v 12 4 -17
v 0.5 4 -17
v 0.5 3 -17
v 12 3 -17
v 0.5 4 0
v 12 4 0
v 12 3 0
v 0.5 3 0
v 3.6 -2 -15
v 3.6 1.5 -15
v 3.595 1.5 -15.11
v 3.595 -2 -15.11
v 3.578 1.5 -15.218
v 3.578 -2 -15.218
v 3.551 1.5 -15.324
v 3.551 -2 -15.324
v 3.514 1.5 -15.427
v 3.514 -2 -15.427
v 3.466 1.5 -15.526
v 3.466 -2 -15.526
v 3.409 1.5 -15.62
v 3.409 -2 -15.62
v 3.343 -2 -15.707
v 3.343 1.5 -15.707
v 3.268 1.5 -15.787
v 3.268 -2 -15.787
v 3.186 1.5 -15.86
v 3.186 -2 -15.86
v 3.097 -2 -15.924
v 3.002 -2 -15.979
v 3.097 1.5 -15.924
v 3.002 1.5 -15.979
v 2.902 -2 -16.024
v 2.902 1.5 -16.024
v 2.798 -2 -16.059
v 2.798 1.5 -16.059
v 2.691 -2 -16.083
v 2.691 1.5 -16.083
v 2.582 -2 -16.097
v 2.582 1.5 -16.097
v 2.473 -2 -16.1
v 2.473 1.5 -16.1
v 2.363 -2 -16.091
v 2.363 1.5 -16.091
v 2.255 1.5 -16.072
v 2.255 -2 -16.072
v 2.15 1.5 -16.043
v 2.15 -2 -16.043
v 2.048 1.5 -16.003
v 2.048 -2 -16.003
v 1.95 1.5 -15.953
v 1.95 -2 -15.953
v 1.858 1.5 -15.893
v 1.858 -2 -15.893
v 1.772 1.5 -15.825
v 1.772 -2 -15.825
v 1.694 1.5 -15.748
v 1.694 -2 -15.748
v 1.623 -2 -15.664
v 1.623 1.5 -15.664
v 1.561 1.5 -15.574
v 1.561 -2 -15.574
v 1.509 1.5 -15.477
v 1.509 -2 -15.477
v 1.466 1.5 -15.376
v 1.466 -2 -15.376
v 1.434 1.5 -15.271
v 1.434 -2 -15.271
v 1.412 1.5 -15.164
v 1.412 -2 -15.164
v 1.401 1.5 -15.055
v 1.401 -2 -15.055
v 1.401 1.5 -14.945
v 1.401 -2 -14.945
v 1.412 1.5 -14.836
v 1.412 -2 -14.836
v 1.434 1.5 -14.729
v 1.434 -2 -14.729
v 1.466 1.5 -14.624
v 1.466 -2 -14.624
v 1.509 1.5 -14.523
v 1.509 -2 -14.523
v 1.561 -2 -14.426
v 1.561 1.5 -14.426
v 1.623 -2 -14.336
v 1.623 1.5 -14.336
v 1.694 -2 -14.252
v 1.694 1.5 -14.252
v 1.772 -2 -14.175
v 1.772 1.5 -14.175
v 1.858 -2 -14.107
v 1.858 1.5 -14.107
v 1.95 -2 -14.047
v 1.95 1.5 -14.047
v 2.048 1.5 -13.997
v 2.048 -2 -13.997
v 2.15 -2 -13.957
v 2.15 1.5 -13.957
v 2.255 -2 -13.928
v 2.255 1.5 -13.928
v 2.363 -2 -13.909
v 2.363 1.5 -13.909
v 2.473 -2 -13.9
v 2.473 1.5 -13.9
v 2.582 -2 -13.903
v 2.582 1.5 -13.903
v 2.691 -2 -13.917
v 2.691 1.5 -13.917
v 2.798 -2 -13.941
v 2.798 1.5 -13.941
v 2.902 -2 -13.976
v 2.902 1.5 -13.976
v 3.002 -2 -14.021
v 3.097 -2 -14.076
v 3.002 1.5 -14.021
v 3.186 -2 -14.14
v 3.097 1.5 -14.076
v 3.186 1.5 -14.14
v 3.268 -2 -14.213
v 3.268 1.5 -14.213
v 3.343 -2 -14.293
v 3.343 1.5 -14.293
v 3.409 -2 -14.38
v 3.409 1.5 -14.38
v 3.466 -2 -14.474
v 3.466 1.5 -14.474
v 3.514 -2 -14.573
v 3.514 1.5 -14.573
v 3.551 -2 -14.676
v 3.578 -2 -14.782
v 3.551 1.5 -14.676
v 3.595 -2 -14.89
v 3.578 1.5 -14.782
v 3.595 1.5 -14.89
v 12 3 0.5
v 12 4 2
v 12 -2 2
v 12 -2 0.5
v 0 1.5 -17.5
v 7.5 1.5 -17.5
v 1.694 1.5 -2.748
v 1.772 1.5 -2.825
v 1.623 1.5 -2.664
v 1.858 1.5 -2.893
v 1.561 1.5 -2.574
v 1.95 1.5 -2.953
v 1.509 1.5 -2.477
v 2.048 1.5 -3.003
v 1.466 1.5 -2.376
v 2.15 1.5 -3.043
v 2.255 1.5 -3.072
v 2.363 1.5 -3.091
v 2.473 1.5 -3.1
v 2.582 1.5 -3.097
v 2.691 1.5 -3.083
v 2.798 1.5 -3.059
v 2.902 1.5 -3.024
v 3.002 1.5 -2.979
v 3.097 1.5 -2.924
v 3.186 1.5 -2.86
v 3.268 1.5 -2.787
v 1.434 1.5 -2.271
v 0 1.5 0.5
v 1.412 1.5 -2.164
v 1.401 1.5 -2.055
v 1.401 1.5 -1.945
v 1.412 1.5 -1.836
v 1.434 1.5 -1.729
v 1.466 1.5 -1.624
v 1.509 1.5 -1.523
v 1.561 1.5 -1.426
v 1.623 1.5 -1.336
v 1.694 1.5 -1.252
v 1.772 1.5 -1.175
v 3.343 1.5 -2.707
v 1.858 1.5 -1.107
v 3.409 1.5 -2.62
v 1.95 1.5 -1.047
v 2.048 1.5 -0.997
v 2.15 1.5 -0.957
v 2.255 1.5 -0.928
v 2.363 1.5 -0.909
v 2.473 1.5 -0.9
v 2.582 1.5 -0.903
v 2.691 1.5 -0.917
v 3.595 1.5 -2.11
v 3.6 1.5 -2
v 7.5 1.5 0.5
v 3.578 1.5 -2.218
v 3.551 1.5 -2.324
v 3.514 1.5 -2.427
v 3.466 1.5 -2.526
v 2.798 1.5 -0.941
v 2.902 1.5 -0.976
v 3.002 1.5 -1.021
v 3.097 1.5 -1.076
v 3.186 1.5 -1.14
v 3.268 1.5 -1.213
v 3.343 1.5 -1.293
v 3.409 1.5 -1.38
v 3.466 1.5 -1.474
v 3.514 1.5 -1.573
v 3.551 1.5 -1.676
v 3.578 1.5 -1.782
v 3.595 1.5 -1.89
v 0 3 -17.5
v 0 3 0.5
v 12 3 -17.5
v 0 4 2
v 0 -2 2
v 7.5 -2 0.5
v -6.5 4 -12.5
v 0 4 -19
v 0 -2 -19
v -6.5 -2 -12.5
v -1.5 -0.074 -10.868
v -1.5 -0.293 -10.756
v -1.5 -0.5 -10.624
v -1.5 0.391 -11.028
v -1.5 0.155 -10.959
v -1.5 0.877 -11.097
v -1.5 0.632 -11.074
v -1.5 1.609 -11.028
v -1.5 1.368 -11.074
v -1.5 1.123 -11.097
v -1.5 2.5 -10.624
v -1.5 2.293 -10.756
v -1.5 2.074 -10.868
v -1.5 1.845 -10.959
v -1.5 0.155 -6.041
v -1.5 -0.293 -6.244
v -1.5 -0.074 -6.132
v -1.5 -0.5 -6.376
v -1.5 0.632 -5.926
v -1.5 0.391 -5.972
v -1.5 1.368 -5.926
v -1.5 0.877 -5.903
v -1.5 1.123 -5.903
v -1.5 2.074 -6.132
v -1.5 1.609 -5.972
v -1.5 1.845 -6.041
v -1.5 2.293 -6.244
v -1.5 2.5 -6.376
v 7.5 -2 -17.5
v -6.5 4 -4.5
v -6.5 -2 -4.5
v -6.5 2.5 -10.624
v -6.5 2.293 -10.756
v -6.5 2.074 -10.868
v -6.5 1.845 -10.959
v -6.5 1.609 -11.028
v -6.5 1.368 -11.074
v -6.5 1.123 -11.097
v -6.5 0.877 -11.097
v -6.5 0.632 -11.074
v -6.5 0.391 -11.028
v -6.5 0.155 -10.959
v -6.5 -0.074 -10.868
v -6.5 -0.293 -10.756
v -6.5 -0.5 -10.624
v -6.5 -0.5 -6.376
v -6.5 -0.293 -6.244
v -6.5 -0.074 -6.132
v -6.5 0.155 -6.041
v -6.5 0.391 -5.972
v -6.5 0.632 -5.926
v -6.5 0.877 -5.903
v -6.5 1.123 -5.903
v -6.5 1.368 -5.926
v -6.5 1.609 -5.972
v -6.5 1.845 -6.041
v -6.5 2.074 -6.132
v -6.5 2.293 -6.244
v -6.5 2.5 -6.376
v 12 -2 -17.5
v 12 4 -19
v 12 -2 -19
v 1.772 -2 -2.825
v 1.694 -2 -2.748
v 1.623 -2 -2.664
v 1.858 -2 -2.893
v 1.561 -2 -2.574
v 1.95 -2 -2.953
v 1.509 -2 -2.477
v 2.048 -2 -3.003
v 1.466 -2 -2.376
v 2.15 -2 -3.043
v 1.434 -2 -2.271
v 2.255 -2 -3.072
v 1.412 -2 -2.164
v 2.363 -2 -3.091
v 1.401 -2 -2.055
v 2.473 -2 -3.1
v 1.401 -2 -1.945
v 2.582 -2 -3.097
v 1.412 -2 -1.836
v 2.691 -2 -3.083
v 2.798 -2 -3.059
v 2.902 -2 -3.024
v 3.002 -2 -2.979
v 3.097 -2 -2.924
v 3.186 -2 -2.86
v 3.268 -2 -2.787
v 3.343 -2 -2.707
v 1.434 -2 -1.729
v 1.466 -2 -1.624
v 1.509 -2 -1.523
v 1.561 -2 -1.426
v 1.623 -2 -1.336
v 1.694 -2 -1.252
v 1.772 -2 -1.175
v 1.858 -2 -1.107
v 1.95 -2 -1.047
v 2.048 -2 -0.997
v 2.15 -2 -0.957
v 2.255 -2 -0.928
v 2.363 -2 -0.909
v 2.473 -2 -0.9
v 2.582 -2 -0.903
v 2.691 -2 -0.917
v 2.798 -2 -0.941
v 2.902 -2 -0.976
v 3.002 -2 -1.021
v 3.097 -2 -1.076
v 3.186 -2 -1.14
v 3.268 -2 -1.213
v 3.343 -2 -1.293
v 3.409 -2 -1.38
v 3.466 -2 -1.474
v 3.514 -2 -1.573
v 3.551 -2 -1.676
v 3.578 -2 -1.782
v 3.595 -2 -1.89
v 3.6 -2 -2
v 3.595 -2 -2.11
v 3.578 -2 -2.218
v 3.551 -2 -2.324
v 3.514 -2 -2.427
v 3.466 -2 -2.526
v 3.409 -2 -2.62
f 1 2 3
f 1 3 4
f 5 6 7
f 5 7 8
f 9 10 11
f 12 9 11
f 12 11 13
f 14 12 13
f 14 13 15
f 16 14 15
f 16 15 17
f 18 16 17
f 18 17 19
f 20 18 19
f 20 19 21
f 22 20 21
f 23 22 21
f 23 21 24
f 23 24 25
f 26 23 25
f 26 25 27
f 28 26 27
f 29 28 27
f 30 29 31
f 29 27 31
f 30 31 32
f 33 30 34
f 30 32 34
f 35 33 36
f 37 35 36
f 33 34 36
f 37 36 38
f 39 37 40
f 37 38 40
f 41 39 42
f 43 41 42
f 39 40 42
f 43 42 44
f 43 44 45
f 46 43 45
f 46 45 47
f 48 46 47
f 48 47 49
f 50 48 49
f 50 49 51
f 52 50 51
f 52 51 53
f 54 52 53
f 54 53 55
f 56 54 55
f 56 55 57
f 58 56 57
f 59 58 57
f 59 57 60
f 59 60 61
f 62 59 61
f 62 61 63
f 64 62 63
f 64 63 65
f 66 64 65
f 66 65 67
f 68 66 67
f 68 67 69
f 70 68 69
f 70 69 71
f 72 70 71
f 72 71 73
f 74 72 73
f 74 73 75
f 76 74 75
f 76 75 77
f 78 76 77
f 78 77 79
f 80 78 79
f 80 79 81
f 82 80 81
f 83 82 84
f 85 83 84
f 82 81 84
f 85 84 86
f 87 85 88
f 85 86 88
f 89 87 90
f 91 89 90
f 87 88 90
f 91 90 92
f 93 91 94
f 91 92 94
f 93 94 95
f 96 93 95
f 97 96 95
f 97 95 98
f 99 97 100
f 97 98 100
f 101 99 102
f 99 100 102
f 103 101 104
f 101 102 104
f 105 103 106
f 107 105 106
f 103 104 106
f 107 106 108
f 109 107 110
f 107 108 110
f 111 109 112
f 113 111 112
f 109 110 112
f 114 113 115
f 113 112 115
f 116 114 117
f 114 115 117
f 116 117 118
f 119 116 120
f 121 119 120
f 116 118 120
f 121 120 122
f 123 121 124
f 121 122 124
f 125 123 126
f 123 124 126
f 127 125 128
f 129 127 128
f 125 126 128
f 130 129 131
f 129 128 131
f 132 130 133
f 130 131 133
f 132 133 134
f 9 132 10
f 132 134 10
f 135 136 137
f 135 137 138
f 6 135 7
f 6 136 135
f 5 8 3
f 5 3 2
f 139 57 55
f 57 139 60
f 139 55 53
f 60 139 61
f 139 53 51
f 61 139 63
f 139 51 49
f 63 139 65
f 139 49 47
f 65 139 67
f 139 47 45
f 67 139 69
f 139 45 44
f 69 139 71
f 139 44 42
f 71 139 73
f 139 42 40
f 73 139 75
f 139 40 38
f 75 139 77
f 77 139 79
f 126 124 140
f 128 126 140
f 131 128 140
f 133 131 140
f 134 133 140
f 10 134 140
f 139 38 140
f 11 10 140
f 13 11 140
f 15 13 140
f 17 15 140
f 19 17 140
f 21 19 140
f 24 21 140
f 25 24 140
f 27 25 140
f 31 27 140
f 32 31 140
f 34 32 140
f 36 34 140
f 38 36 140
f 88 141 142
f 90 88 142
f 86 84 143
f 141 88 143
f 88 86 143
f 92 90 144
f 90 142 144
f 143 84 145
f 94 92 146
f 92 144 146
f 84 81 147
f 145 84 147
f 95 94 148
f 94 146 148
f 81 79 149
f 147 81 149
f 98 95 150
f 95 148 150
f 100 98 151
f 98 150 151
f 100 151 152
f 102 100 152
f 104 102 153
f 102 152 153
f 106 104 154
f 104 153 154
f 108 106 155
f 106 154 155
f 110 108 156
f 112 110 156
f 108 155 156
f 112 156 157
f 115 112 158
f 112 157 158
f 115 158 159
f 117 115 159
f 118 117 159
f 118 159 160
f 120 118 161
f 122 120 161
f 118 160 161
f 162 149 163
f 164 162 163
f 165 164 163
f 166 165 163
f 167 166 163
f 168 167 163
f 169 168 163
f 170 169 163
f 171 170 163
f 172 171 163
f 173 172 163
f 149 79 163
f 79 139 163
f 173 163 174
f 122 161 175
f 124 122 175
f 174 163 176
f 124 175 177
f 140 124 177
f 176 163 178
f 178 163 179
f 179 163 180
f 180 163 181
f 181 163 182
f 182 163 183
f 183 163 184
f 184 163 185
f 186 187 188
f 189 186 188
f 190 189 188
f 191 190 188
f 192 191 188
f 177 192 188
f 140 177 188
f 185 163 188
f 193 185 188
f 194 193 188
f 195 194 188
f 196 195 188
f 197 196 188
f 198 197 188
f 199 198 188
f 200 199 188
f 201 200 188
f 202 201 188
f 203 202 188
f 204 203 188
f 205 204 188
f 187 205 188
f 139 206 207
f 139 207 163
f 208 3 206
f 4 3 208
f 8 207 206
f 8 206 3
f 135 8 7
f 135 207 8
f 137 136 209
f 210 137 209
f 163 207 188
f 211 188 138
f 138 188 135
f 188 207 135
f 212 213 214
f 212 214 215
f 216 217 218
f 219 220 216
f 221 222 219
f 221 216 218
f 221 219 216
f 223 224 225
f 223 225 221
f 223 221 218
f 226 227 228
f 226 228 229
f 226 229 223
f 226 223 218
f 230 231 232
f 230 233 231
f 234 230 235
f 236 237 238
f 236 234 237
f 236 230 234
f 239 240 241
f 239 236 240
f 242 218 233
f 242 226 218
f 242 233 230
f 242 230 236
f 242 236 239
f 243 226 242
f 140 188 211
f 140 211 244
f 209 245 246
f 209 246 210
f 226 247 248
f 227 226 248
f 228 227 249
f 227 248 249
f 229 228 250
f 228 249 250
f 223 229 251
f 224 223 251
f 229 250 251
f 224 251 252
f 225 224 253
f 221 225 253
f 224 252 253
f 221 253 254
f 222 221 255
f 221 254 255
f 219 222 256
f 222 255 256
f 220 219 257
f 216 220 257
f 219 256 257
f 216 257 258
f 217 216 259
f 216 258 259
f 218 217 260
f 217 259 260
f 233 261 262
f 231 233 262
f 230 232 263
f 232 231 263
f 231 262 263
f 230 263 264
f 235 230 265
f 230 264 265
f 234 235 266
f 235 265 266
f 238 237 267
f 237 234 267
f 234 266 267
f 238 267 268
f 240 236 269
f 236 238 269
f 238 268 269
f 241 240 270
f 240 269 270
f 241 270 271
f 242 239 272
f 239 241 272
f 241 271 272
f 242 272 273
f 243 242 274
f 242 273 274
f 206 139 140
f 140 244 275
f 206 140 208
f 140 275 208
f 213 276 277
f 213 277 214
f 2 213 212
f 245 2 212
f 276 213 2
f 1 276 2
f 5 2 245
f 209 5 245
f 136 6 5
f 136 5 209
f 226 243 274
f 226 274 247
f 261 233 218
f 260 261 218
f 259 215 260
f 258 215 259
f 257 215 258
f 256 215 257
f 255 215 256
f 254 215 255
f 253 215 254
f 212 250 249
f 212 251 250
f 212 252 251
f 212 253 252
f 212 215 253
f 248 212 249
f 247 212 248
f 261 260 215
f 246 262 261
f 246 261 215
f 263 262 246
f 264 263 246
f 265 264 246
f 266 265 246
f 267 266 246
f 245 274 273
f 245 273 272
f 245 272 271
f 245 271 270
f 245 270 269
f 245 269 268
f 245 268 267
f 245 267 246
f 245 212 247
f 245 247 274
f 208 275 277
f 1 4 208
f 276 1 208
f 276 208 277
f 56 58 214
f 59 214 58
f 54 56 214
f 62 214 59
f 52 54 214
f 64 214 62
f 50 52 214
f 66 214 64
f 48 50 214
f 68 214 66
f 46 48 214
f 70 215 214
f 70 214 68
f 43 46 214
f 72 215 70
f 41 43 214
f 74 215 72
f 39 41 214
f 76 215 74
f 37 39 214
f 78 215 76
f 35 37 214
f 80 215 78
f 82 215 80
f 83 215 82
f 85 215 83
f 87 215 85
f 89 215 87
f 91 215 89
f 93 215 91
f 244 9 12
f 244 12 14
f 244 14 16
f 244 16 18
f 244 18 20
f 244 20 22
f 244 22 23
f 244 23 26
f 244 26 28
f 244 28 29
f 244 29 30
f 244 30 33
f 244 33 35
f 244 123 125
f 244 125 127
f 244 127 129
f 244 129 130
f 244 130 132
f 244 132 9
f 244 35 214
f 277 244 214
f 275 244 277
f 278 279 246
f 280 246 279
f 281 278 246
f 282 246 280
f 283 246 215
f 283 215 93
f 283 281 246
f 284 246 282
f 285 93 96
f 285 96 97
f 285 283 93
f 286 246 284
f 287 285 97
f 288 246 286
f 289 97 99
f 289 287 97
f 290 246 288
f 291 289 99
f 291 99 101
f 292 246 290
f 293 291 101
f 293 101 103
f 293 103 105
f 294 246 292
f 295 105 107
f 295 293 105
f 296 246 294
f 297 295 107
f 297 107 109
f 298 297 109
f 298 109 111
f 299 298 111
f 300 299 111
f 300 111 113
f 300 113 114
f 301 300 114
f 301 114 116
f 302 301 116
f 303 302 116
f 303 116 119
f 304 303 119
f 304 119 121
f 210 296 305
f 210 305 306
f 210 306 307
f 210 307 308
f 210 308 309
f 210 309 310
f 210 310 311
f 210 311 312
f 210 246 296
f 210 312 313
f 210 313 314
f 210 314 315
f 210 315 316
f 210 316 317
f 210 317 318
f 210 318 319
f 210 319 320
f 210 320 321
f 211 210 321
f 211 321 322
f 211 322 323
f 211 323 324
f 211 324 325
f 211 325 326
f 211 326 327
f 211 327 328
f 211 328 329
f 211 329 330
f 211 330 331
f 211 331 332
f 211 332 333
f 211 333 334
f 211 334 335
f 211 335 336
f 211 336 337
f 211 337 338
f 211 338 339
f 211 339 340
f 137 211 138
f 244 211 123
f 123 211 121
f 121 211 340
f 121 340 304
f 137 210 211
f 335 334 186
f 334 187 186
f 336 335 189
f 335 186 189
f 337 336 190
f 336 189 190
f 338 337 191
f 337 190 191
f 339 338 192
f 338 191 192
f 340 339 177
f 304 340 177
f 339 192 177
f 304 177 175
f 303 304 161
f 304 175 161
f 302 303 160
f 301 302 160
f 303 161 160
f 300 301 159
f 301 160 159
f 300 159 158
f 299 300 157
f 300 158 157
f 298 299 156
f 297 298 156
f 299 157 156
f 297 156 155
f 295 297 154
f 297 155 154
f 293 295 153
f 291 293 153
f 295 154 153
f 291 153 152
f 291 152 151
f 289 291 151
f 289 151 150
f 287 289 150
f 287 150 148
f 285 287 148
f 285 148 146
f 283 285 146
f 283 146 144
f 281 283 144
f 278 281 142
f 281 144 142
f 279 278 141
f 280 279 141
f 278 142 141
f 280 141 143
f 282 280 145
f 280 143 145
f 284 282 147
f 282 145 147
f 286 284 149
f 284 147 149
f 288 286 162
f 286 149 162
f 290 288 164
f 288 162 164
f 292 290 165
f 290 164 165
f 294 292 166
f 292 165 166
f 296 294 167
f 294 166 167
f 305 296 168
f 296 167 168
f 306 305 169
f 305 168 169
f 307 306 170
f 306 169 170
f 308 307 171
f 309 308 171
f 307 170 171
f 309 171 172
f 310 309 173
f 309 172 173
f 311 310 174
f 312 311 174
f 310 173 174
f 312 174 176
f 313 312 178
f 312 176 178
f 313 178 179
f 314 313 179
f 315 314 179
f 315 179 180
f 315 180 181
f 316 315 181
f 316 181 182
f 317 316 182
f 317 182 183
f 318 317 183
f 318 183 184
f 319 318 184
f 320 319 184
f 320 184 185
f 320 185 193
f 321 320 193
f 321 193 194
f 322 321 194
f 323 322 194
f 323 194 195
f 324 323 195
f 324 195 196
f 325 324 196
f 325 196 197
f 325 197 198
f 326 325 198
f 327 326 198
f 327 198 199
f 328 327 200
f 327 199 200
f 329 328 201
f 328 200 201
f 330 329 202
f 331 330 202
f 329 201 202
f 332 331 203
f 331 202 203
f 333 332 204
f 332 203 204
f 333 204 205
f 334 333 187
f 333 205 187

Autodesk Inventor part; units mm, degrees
ref_plane "YZ Plane" through (0, 0, 0) normal (1, 0, 0) x (0, 1, 0)
ref_plane "XZ Plane" through (0, 0, 0) normal (0, 1, 0) x (-1, 0, 0)
ref_plane "XY Plane" through (0, 0, 0) normal (0, 0, 1) x (1, 0, 0)
sketch "Sketch1" plane through (0, 0, 0) normal (0, 1, 0) x (-1, 0, 0)
  line L0 (0, 0) -> (-12, 0)
  line L1 (-12, 0) -> (-12, -17)
  line L2 (-12, -17) -> (0, -17)
  line L3 (0, -17) -> (0, 0)
  line L4 (0, 0) -> (2, 0)
  line L5 (2, 0) -> (2, 2)
  line L6 (2, 2) -> (-12, 2)
  line L7 (-12, 2) -> (-12, -19)
  line L8 (-12, -19) -> (2, -19)
  line L9 (2, -19) -> (2, 2)
  dimension "d0" = 12
  dimension "d1" = 17
  dimension "d2" = 2
  dimension "d3" = 2
  dimension "d4" = 21
extrude "Extrusion1" add sketch "Sketch1" along normal blind 4
sketch "Sketch3" plane through (0, 4, 0) normal (0, 1, 0) x (1, 0, 0)
  line L0 (12, -2) -> (12, 19) projected
  line L1 (0, 0) -> (12, 0)
  line L2 (12, 0) -> (12, 17)
  line L3 (12, 17) -> (0, 17)
  line L4 (0, 17) -> (0, 0)
  dimension "d7" = 17
extrude "Extrusion2" cut sketch "Sketch3" against normal blind 2.5
sketch "Sketch4" plane through (0, 4, 0) normal (1, 0, 0) x (0, 0, -1)
  line L0 (-2, 0) -> (0, 0) projected
  line L1 (17, 0) -> (17, -2.5) projected
  line L2 (0, 0) -> (17, 0)
  line L3 (17, 0) -> (17, -1.5)
  line L4 (17, -1.5) -> (0, -1.5)
  line L5 (0, -1.5) -> (0, 0)
  point P0 (0, -4)
  dimension "d10" = 1.5
extrude "Extrusion3" add sketch "Sketch4" along normal blind 0.5
sketch "Sketch5" plane through (0, 1.5, -17) normal (0, 0, 1) x (1, 0, 0)
  line L0 (12, 2.5) -> (12, 0) projected
  line L1 (0.5, 2.5) -> (12, 2.5)
  line L2 (12, 2.5) -> (12, 1)
  line L3 (12, 1) -> (0.5, 1)
  line L4 (0.5, 1) -> (0.5, 2.5)
  point P0 (0, -1.5)
  dimension "d13" = 1.5
extrude "Extrusion4" add sketch "Sketch5" along normal blind 0.5
sketch "Sketch6" plane through (12, 1.5, 0) normal (0, 0, -1) x (-1, 0, 0)
  line L0 (14, 2.5) -> (0, 2.5) projected
  line L1 (12, 1) -> (11.5, 1) projected
  line L2 (0, 2.5) -> (11.5, 2.5)
  line L3 (11.5, 2.5) -> (11.5, 1)
  line L4 (11.5, 1) -> (0, 1)
  line L5 (0, 1) -> (0, 2.5)
  point P0 (12, -1.5)
  dimension "d20" = 1.5
extrude "Extrusion5" add sketch "Sketch6" along normal blind 0.5
sketch "Sketch7" plane through (12, 0, 2) normal (1, 0, 0) x (0, 0, -1)
  line L0 (19, 2.5) -> (19, 1.5) projected
  line L1 (19, 1.5) -> (2, 1.5)
  line L2 (2, 1.5) -> (2, 0)
  line L3 (2, 0) -> (19, 0)
  line L4 (19, 0) -> (19, 1.5)
extrude "Extrusion6" cut sketch "Sketch7" against normal blind 3.5
sketch "Sketch8" plane through (-2, 0, -19) normal (-1, 0, 0) x (0, 0, 1)
  line L0 (0, 0) -> (21, 0) projected
  line L1 (21, 0) -> (21, 4) projected
  line L2 (0, 4) -> (21, 4) projected
  line L3 (0, 0) -> (0, 4) projected
  point P0 (19, 0)
extrude "Extrusion7" add sketch "Sketch8" along normal blind 4.5
chamfer "Chamfer2" distance 6.5 angle 45 1 edges at (-6.5, 2, 2)
sketch "Sketch16" plane through (0, 2.5, -17) normal (0, 0, 1) x (1, 0, 0)
  line L0 (12, 0) -> (0, 0) projected
  line L1 (0, 0) -> (0, -1) projected
  line L2 (0, -1) -> (8.5, -1) projected
  line L3 (8.5, -1) -> (8.5, -2.5) projected
  line L4 (12, -2.5) -> (8.5, -2.5) projected
  line L5 (12, 0) -> (12, -2.5) projected
  point P0 (0, -2.5)
extrude "Extrusion14" cut sketch "Sketch16" against normal blind 0.5
sketch "Sketch17" plane through (12, 2.5, 0) normal (0, 0, -1) x (-1, 0, 0)
  line L0 (12, 0) -> (0, 0) projected
  line L1 (0, -2.5) -> (0, 0) projected
  line L2 (3.5, -2.5) -> (0, -2.5) projected
  line L3 (3.5, -2.5) -> (3.5, -1) projected
  line L4 (3.5, -1) -> (12, -1) projected
  line L5 (12, 0) -> (12, -1) projected
  point P0 (12, -2.5)
extrude "Extrusion15" cut sketch "Sketch17" against normal blind 0.5
sketch "Sketch18" plane through (0.5, 2.5, -16.5) normal (0, -1, 0) x (1, 0, 0)
  line L0 (-0.5, -1) -> (-0.5, 17) projected
  line L1 (-0.5, -1) -> (11.5, -1) projected
  line L2 (11.5, 0) -> (11.5, -1) projected
  line L3 (0, 0) -> (11.5, 0) projected
  line L4 (0, 16) -> (0, 0) projected
  line L5 (11.5, 16) -> (0, 16) projected
  line L6 (11.5, 17) -> (11.5, 16) projected
  line L7 (11.5, 17) -> (-0.5, 17) projected
  point P0 (-0.5, 16.5)
extrude "Extrusion16" cut sketch "Sketch18" against normal blind 0.5
chamfer "Chamfer3" distance 6.5 angle 45 1 edges at (-6.5, 2, -19)
sketch "Sketch19" plane through (0, 0, 0) normal (0, -1, 0) x (1, 0, 0)
  line L0 (0, -19) -> (-6.5, -12.5) projected
  line L1 (12, -19) -> (0, -19) projected
  line L2 (12, -17.5) -> (12, -19) projected
  line L3 (12, -17.5) -> (8.5, -17.5) projected
  line L4 (8.5, -17.5) -> (8.5, 0.5) projected
  line L5 (8.5, 0.5) -> (12, 0.5) projected
  line L6 (12, 2) -> (12, 0.5) projected
  line L7 (12, 2) -> (0, 2) projected
  line L8 (-6.5, -4.5) -> (0, 2) projected
  line L9 (-6.5, -12.5) -> (-6.5, -4.5) projected
  point P0 (0, 0)
extrude "Extrusion17" add sketch "Sketch19" along normal blind 2
sketch "Sketch22" plane through (0, 1.5, -16.5) normal (0, 0, 1) x (1, 0, 0)
  line L0 (0.5, 1.5) -> (12, 1.5) projected
  line L1 (12, 1.5) -> (12, 2.5) projected
  line L2 (12, 2.5) -> (0.5, 2.5) projected
  line L3 (0.5, 1.5) -> (0.5, 2.5) projected
  point P0 (0, -1.5)
extrude "Extrusion20" cut sketch "Sketch22" against normal blind 0.5
sketch "Sketch23" plane through (12, 1.5, -0.5) normal (0, 0, -1) x (-1, 0, 0)
  line L0 (0, 1.5) -> (11.5, 1.5) projected
  line L1 (11.5, 2.5) -> (11.5, 1.5) projected
  line L2 (11.5, 2.5) -> (0, 2.5) projected
  line L3 (0, 2.5) -> (0, 1.5) projected
  point P0 (12, -1.5)
extrude "Extrusion21" cut sketch "Sketch23" against normal blind 0.5
sketch "Sketch24" plane through (-6.5, 0, -19) normal (-1, 0, 0) x (0, 0, 1)
  circle A0 centre (10.5, 1) radius 2.6
  point P0 (19, 0)
  dimension "d79" = 5.2
extrude "Extrusion22" cut sketch "Sketch24" against normal blind 5
sketch "Sketch25" plane through (-1.5, 1, -8.5) normal (-1, 0, 0) x (0, 0, 1)
  circle A0 centre (0, 0) radius 2.6 projected
  line L0 (0, 0) -> (0, -1.5)
  line L1 (0, -1.5) -> (2.1237, -1.5)
  line L2 (0, -1.5) -> (-2.1237, -1.5)
  arc A1 (-2.1237, -1.5) -> (2.1237, -1.5) centre (0, 0) ccw
  arc A2 (2.0494, 1.6) -> (-2.0494, 1.6) centre (0, 0) ccw
  line L3 (0, 0) -> (0, 1.5)
  line L4 (2.1237, 1.5) -> (-2.1237, 1.5)
  line L5 (-2.6, 0) -> (2.6, 0)
  point P0 (8.5, -1)
  dimension "d88" = 1.5
  dimension "d89" = 1.5
  dimension "d90" = 5.2
extrude "Extrusion23" add sketch "Sketch25" along normal blind 5 contours L4 A0 | A0 L2 L1
sketch "Sketch26" plane through (0, 1.5, 0) normal (0, 1, 0) x (1, 0, 0)
  circle A0 centre (2.5, 2) radius 1.1
  line L0 (0, -0.5) -> (0, 17.5) projected
  line L1 (0, -0.5) -> (8.5, -0.5) projected
  line L2 (8.5, -0.5) -> (8.5, 17.5) projected
  line L3 (8.5, 8.5) -> (0, 8.5)
  circle A1 centre (2.5, 15) radius 1.1
  point P0 (0, 0)
  dimension "d91" = 2.2
  dimension "d92" = 2.5
  dimension "d93" = 2.5
extrude "Extrusion24" cut sketch "Sketch26" against normal blind 3.5 contours A0 | A1
sketch "Sketch27" plane through (8.5, 0, 2) normal (1, 0, 0) x (0, 0, -1)
  line L0 (19.5, -2) -> (19.5, 1.5) projected
  line L1 (1.5, 1.5) -> (19.5, 1.5) projected
  line L2 (1.5, 1.5) -> (1.5, -2) projected
  line L3 (19.5, -2) -> (1.5, -2) projected
  point P0 (2, 0)
extrude "Extrusion25" cut sketch "Sketch27" against normal blind 1
properties part number "sensorHolder"
